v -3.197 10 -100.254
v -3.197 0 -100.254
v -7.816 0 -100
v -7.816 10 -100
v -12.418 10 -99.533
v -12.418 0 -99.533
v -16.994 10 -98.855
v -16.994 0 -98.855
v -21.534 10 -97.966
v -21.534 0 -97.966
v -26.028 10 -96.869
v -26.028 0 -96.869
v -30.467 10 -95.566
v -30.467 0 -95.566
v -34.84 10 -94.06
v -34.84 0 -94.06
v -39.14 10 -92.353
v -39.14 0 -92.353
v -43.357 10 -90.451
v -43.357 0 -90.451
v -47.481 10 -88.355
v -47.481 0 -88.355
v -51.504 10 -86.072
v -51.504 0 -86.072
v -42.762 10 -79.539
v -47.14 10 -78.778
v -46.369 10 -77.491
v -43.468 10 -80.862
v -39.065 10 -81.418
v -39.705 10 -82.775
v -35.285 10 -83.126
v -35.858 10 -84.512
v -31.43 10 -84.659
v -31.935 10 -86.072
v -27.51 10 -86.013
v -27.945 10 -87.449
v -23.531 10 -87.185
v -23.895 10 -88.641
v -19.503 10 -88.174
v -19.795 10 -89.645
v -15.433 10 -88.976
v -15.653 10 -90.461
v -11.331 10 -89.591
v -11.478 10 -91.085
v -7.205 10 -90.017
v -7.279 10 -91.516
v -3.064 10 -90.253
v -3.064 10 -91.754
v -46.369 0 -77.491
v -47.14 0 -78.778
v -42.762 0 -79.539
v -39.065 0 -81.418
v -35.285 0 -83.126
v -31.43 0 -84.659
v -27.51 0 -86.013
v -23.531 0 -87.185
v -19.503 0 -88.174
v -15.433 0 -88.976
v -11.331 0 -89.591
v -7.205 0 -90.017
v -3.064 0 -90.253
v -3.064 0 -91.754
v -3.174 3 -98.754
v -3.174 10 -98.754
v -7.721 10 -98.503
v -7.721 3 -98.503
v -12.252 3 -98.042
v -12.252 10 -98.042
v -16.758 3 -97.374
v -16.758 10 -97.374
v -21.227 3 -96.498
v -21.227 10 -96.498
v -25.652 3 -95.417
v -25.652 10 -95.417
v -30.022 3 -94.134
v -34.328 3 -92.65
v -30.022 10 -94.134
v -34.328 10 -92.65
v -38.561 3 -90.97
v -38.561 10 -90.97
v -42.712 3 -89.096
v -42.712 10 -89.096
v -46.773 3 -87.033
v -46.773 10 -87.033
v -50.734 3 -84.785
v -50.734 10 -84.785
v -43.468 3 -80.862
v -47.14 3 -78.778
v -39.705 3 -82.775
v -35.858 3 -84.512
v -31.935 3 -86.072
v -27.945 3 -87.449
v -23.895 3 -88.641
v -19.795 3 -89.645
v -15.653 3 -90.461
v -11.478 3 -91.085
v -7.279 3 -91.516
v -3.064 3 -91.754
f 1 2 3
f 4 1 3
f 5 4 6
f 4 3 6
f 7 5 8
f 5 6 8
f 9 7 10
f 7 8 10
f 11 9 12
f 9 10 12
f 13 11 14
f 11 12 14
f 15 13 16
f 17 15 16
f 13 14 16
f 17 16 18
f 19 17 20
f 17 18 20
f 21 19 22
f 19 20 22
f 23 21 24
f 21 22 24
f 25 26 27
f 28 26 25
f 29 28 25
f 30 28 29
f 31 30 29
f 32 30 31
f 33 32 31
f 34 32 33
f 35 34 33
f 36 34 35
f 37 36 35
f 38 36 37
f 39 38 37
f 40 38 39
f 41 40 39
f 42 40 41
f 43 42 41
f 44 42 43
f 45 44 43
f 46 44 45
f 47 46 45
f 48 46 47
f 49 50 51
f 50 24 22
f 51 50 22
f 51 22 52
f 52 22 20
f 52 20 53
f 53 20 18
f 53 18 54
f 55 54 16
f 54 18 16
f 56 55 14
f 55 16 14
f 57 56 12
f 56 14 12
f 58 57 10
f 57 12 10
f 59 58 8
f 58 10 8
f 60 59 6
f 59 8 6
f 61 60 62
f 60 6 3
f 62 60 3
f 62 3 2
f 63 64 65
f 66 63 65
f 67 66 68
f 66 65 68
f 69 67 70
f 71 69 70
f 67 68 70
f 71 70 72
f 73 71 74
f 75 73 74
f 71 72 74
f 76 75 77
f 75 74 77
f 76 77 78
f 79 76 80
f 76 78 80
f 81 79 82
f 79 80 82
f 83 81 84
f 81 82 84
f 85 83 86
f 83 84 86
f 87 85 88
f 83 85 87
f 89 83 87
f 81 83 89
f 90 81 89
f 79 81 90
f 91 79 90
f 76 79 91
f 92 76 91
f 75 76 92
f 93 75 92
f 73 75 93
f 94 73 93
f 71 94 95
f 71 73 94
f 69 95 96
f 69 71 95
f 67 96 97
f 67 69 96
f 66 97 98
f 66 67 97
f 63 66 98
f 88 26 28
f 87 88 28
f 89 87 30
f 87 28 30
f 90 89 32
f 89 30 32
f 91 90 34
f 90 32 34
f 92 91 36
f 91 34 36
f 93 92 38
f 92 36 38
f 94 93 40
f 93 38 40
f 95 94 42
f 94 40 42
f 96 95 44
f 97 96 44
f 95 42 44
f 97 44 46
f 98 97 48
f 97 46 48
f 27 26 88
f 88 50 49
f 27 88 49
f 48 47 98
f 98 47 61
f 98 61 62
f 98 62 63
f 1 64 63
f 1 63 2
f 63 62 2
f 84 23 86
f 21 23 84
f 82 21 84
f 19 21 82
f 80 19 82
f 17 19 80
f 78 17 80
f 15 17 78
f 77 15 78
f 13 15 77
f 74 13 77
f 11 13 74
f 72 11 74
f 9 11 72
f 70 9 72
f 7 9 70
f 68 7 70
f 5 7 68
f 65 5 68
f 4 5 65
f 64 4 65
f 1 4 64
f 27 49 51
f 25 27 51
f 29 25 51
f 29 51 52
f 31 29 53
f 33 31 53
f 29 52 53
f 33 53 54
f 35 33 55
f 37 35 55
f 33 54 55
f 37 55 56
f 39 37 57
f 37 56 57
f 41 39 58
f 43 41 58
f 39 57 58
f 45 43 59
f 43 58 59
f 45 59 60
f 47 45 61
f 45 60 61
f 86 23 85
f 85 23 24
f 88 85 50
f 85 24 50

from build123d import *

# Parameters (mm, degrees)
BOSS_EXTRUDE1_DEPTH = 10
CUT_EXTRUDE1_DEPTH  = 7


with BuildPart() as part:
    # Sketch2 → Boss-Extrude1 (new body)
    with BuildSketch(Plane(origin=(0, 0, 0), x_dir=(1, 0, 0), z_dir=(0, 1, 0))):
        with BuildLine():
            Line((-51.50406107, 86.072206422), (-47.139527706, 78.778315244))
            Line((-47.139527706, 78.778315244), (-46.369315936, 77.491157977))
            ThreePointArc((-46.369315936, 77.491157977), (-25.527153744, 86.621922437), (-3.064253537, 90.252996489))
            Line((-3.064253537, 90.252996489), (-3.064253537, 91.753846651))
            Line((-3.064253537, 91.753846651), (-3.197123883, 100.254034452))
            ThreePointArc((-3.197123883, 100.254034452), (-28.254839769, 96.243218227), (-51.50406107, 86.072206422))
        make_face()
    extrude(amount=BOSS_EXTRUDE1_DEPTH)

    # Sketch4 → Cut-Extrude1 (cut)
    with BuildSketch(Plane(origin=(0, 10, 0), x_dir=(1, 0, 0), z_dir=(0, 1, 0))):
        with BuildLine():
            Line((-50.7338493, 84.785049155), (-47.139527706, 78.778315244))
            ThreePointArc((-47.139527706, 78.778315244), (-25.92674327, 88.067939731), (-3.064253537, 91.753846651))
            Line((-3.064253537, 91.753846651), (-3.173676414, 98.754016642))
            ThreePointArc((-3.173676414, 98.754016642), (-27.844000167, 94.800525735), (-50.7338493, 84.785049155))
        make_face()
    extrude(amount=-CUT_EXTRUDE1_DEPTH, mode=Mode.SUBTRACT)


solid = part.part
